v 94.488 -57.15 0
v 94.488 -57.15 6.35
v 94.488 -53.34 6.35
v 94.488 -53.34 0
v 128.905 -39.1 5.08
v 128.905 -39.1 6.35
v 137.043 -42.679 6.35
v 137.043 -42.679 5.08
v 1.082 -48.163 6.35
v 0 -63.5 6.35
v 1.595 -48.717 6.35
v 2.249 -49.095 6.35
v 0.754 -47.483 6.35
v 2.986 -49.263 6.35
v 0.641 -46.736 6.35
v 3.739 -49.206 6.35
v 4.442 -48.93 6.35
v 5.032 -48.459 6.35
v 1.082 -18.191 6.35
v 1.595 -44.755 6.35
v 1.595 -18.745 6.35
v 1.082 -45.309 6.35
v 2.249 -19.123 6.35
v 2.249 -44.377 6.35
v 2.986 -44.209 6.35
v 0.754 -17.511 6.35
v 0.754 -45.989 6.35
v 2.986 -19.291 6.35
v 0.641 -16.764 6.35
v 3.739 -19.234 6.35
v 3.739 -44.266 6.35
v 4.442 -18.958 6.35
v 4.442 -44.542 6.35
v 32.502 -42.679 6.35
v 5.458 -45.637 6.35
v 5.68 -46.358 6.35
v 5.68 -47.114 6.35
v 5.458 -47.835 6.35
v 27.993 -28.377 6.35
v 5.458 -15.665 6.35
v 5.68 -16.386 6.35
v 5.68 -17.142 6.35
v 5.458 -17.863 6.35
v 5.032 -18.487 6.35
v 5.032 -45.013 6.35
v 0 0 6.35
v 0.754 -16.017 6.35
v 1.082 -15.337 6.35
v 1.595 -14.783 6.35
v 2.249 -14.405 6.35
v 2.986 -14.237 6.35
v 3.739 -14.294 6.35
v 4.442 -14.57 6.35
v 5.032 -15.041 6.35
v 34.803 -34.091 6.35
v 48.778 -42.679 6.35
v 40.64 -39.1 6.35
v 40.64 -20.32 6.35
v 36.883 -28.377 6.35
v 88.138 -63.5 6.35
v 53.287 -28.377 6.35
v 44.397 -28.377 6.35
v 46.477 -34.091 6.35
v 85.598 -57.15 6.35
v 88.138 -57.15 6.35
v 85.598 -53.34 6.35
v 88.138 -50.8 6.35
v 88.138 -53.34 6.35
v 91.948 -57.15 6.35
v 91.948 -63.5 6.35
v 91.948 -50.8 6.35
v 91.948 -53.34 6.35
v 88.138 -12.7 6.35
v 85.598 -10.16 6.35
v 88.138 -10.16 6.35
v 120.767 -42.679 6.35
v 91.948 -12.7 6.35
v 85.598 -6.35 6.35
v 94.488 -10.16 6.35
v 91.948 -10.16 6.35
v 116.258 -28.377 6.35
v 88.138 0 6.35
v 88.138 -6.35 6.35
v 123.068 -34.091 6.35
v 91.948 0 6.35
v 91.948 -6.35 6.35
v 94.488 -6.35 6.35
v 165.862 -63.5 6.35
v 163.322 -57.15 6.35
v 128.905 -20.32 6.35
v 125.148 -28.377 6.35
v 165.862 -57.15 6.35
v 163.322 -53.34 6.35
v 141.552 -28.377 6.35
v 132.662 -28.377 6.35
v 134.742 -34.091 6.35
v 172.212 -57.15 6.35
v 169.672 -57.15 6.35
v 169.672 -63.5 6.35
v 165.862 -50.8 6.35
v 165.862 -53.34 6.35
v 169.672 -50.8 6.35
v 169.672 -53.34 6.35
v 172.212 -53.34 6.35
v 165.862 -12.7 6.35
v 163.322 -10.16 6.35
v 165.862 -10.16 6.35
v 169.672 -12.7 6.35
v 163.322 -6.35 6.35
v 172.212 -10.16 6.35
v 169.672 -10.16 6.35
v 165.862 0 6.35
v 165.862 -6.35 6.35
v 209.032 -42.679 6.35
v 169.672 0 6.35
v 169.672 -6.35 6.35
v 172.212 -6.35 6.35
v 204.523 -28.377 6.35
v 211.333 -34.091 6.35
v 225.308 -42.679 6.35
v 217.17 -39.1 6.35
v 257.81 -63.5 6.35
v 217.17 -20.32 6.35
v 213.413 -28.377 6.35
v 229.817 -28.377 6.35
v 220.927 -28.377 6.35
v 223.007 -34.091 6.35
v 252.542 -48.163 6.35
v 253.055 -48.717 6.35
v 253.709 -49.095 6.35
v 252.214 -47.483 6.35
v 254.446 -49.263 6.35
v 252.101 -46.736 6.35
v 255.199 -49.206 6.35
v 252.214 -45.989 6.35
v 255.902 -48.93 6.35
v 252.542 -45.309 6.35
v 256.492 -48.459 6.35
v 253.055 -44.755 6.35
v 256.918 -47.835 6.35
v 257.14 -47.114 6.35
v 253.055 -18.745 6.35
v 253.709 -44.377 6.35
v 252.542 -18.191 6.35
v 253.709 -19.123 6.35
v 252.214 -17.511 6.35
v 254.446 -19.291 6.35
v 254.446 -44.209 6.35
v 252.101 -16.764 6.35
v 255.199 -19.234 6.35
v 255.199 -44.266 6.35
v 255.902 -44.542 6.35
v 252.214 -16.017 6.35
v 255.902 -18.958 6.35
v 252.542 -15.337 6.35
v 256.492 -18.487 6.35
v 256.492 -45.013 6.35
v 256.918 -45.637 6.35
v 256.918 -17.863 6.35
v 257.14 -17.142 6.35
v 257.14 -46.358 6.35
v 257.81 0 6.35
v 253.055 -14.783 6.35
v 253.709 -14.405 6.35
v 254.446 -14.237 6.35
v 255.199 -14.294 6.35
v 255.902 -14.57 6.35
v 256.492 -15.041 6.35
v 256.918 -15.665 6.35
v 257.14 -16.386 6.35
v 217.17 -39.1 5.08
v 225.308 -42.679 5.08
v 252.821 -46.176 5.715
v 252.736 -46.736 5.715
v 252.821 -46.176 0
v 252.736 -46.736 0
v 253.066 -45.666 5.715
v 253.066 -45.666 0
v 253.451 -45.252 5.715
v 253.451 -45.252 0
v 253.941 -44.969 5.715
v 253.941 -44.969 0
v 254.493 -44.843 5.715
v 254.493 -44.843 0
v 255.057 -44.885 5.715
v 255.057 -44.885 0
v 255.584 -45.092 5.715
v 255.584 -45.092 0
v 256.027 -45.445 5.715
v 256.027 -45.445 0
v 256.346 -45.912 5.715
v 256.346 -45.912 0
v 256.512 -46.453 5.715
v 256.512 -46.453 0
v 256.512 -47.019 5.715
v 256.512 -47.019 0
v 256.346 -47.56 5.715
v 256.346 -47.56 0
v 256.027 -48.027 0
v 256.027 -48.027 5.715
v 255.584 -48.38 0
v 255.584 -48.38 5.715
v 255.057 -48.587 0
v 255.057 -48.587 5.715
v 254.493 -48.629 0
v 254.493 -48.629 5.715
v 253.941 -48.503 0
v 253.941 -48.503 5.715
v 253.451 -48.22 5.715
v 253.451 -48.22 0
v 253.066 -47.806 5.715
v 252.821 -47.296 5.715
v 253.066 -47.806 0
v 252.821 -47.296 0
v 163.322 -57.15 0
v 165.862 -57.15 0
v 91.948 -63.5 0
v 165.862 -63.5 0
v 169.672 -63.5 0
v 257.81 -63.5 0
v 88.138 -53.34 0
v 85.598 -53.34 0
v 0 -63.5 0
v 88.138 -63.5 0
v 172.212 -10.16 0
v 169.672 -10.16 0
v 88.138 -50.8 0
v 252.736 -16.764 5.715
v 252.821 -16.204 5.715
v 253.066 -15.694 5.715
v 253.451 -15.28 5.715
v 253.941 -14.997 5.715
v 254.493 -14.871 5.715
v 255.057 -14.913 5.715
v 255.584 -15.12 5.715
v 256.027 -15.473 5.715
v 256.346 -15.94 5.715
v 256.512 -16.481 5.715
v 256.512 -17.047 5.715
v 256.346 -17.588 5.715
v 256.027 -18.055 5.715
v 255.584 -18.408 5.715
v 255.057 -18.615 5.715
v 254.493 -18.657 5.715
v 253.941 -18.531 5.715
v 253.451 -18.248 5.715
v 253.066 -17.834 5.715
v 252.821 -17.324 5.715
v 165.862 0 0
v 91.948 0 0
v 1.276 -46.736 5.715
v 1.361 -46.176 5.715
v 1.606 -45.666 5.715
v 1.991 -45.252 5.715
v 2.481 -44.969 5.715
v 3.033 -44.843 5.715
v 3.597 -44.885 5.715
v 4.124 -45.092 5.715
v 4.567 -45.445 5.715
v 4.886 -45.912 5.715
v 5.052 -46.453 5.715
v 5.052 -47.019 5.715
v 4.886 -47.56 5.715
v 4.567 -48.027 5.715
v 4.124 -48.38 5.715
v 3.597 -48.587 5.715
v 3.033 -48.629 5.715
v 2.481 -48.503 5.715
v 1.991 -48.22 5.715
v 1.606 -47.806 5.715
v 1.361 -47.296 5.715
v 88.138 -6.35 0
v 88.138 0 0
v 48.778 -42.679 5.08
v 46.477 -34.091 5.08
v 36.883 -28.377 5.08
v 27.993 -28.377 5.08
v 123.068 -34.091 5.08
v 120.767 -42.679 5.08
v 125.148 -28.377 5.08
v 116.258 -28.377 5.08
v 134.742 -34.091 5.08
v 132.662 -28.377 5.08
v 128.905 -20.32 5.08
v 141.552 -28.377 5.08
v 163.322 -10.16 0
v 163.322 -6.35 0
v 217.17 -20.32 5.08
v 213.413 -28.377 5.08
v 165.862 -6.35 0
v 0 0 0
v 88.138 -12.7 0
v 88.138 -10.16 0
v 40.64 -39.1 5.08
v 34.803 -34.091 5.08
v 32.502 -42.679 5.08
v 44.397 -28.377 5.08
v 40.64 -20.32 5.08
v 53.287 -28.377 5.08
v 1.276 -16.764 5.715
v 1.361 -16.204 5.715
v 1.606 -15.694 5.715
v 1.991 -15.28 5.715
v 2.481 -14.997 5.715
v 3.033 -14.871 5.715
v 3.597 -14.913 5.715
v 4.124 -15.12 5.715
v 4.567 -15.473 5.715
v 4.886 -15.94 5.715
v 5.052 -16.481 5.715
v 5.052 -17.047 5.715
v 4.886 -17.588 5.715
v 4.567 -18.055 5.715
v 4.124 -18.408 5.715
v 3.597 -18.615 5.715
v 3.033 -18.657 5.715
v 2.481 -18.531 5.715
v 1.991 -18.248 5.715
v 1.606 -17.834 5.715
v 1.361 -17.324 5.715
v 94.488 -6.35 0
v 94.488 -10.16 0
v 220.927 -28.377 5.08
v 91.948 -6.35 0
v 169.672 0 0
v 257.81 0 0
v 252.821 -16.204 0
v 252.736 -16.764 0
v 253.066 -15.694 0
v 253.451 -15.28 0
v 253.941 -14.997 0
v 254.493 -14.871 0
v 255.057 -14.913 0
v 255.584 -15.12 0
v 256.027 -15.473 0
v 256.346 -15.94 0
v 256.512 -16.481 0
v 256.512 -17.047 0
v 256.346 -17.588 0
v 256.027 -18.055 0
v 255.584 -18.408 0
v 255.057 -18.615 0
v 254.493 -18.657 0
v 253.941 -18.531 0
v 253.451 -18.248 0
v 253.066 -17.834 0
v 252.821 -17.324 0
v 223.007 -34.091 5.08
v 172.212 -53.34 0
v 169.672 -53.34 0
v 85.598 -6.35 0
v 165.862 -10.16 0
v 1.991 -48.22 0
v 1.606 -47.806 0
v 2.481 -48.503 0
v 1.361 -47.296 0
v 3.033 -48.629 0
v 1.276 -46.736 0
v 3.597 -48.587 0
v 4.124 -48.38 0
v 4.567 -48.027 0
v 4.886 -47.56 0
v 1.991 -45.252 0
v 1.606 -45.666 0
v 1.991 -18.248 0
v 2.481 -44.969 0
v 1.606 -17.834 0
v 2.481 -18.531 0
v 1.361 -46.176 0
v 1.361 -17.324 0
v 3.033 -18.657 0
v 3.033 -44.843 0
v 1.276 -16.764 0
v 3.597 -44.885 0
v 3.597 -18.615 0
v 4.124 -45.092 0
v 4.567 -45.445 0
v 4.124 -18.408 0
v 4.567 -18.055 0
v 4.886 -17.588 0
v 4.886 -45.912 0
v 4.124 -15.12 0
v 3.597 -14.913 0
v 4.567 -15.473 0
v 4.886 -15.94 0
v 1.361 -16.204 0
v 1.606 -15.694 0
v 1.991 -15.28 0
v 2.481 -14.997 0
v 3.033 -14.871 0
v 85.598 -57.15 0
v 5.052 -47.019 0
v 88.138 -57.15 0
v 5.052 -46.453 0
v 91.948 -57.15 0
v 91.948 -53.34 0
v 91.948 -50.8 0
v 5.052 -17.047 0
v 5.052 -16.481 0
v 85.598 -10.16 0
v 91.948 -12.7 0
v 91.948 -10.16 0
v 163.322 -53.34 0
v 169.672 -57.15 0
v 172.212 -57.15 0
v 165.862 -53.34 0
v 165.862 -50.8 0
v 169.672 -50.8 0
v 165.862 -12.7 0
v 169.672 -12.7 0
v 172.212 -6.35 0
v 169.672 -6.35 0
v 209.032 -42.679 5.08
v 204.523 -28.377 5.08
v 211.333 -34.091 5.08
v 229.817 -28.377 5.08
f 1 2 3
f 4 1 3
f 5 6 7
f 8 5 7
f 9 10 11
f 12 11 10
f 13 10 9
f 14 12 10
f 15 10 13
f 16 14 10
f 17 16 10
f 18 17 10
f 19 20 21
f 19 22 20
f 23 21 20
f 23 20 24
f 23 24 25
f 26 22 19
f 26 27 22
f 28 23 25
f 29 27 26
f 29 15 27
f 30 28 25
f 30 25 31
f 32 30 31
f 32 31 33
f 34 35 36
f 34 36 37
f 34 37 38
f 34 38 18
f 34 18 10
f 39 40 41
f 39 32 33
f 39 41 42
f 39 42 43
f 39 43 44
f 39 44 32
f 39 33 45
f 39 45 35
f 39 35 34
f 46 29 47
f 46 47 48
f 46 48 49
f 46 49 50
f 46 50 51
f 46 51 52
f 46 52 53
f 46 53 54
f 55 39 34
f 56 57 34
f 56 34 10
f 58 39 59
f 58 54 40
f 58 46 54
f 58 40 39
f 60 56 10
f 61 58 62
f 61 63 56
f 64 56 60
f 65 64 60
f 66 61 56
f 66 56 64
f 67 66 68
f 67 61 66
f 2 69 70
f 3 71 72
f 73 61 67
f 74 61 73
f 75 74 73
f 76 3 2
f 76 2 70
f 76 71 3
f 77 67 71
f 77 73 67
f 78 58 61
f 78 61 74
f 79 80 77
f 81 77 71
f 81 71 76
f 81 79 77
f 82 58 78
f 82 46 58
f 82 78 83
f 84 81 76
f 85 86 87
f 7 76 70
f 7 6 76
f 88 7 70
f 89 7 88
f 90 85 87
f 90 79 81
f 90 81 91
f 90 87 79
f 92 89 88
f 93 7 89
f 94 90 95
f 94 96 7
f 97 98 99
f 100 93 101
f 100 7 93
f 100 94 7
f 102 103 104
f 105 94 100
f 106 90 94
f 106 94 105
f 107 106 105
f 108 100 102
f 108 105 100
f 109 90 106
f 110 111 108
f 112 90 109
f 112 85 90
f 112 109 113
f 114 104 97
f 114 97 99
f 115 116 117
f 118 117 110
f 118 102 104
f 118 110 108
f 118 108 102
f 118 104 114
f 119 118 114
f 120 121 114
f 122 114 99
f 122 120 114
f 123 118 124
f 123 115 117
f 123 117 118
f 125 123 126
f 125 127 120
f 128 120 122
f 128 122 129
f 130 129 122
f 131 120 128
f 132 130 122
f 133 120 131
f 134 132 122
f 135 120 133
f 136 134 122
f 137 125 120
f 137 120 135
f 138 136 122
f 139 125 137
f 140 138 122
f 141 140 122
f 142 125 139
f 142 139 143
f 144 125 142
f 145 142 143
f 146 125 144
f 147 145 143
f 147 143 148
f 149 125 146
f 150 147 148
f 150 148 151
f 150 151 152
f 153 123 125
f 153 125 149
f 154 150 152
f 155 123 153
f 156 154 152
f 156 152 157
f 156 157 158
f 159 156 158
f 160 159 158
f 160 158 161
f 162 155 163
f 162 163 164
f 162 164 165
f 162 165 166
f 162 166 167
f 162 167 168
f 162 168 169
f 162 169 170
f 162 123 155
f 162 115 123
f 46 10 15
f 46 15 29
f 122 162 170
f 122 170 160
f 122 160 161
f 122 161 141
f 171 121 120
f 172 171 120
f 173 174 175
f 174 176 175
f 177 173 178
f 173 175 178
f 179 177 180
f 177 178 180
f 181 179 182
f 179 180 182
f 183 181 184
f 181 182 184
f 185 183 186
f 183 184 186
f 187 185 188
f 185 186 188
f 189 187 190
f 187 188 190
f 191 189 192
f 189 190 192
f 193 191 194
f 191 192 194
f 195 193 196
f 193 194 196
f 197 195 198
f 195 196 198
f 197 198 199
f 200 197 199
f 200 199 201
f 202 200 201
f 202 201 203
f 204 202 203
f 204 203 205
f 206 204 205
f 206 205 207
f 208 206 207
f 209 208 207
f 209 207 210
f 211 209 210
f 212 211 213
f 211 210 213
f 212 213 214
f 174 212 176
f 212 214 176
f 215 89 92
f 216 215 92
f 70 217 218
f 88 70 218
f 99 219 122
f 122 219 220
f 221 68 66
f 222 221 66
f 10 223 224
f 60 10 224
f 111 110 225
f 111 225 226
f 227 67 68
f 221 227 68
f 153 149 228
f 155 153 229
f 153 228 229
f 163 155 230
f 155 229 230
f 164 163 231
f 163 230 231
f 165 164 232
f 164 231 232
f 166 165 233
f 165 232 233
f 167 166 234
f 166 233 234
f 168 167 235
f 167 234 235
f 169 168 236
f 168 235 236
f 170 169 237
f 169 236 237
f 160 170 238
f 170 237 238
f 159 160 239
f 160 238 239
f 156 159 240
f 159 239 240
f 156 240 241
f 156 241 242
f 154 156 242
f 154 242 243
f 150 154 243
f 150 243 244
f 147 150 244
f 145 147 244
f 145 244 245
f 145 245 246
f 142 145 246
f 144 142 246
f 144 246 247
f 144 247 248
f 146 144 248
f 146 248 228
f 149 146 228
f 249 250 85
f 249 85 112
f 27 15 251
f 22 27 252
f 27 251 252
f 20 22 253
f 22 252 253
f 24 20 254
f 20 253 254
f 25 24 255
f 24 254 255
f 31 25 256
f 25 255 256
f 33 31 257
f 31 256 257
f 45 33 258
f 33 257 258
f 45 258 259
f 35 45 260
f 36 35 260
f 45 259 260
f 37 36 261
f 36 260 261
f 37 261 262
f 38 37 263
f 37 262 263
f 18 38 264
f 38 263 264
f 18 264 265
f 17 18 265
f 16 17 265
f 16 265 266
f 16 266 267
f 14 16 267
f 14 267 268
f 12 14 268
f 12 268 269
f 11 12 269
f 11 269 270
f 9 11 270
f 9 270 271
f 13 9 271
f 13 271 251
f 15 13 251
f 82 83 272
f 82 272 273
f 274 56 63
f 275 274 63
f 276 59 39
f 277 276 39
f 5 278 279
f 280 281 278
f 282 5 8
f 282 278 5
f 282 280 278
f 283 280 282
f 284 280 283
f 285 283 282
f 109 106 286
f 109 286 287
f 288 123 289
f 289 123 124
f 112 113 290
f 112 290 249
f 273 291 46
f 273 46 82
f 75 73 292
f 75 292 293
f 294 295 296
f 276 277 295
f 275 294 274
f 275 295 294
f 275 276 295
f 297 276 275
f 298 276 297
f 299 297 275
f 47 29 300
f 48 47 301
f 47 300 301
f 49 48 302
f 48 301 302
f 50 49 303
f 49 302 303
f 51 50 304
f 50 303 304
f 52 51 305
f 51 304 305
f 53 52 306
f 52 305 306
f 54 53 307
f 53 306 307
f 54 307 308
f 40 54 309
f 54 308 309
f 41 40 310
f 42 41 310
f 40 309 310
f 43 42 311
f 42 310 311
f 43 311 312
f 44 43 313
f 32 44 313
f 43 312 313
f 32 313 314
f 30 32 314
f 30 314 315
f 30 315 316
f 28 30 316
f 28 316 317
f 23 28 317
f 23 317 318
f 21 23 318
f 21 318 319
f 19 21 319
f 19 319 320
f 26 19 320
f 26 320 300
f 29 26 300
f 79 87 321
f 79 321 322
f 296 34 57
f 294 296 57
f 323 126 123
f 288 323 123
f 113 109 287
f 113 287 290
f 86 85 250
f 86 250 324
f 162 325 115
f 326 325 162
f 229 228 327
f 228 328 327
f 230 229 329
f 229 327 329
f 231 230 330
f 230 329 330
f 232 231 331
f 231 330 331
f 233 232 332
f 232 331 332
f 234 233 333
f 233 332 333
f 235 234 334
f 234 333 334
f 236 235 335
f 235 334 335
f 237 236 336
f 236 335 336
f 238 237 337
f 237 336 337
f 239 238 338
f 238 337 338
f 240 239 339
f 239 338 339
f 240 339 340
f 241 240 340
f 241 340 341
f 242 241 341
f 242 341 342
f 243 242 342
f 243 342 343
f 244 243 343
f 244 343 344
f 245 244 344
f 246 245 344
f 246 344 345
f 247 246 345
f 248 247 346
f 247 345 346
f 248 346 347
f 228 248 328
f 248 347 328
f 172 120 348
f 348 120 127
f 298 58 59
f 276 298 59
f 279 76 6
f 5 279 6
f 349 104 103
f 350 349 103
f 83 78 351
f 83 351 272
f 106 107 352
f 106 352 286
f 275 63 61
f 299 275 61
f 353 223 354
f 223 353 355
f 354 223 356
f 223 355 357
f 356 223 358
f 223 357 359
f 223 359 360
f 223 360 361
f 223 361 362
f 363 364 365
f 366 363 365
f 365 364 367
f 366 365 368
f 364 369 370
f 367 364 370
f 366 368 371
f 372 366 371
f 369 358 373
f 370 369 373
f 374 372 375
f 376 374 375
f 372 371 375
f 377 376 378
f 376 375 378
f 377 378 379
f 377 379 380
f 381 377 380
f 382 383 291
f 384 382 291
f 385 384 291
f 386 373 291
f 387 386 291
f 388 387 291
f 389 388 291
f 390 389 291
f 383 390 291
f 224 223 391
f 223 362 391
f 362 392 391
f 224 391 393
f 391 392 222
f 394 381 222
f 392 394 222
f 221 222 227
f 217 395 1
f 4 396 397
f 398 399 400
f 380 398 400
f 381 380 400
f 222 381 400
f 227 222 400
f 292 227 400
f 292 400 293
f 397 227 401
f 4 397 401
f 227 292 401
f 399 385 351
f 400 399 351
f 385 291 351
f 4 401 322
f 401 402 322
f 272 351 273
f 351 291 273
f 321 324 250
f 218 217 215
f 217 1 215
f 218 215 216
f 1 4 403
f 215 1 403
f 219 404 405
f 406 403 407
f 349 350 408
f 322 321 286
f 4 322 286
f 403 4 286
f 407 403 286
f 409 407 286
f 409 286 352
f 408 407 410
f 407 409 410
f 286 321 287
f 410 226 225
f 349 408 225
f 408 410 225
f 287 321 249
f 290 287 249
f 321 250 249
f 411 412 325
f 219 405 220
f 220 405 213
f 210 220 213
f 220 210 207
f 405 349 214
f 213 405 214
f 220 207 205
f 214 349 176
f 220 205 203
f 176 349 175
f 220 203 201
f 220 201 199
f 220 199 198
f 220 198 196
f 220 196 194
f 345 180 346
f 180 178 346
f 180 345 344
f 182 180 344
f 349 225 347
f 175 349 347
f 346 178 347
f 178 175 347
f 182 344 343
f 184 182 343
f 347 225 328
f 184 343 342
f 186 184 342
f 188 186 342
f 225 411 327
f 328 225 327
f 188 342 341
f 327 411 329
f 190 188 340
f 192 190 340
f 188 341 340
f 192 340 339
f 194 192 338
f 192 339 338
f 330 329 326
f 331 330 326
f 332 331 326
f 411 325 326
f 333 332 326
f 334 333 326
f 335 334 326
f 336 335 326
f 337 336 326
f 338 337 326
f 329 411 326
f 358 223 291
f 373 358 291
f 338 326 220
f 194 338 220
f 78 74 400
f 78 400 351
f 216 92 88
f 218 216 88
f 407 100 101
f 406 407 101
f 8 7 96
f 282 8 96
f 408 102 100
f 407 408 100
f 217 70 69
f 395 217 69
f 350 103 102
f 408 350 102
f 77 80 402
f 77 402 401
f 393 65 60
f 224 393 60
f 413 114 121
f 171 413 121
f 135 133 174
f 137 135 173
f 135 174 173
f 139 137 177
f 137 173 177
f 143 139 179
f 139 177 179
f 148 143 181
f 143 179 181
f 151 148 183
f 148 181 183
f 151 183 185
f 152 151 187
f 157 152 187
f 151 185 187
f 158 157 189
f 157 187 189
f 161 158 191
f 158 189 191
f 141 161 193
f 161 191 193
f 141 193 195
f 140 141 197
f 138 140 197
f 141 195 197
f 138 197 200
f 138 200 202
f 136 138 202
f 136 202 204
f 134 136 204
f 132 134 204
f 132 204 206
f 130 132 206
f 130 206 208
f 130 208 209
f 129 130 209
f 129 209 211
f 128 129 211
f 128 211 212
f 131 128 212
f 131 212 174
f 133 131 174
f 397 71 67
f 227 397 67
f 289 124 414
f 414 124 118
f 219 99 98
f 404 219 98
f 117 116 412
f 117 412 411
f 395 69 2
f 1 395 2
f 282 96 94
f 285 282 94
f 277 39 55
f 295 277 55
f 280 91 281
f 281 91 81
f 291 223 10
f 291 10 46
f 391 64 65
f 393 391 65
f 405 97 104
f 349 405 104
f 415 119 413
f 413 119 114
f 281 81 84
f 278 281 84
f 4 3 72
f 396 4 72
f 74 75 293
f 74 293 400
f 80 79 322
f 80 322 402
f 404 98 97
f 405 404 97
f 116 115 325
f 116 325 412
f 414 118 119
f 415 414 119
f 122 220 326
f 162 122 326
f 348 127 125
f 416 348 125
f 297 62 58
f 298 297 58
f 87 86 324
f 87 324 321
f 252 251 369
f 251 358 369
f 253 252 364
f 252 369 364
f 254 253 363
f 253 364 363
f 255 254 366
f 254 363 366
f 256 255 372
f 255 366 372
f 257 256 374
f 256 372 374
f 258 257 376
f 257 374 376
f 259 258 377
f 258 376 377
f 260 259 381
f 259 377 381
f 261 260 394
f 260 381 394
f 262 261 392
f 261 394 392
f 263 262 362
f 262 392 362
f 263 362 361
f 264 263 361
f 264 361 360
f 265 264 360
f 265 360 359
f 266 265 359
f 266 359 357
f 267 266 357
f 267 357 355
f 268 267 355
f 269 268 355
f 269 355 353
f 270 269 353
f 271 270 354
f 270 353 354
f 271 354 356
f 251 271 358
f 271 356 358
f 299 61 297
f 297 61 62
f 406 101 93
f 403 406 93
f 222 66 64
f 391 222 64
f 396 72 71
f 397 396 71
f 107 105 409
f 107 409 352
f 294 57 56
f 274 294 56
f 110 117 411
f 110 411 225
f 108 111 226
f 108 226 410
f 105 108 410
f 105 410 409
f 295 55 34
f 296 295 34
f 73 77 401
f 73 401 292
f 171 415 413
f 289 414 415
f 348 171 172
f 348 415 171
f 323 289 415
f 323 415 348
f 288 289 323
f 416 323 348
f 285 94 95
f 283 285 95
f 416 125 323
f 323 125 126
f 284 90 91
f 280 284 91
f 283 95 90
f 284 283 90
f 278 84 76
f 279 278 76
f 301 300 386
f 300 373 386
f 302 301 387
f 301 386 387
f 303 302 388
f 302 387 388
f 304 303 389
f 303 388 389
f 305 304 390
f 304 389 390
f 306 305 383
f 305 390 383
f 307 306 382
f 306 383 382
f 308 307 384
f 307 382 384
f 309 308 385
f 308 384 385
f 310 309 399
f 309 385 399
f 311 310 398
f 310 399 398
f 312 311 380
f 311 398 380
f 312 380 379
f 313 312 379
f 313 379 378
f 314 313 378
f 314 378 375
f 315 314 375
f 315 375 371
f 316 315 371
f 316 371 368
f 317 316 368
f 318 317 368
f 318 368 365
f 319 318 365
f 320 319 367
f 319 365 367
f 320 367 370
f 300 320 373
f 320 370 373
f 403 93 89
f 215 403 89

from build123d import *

# Parameters (mm, degrees)
SKETCH1_W                       = 257.81
SKETCH1_H                       = 63.5
BOSS_EXTRUDE1_DEPTH             = 6.35
CUT_EXTRUDE2_DEPTH              = 1.27
CUT_EXTRUDE3_DEPTH              = 266.590979892
F_6_CLEARANCE_HOLE1_D           = 3.7973
F_6_CLEARANCE_HOLE1_CSINK_D     = 5.0673
F_6_CLEARANCE_HOLE1_CSINK_ANGLE = 90


with BuildPart() as part:
    # Sketch1 → Boss-Extrude1 (new body)
    with BuildSketch(Plane.XY):
        with Locations((128.905, -31.75)):
            Rectangle(SKETCH1_W, SKETCH1_H)
    extrude(amount=BOSS_EXTRUDE1_DEPTH)

    # Sketch4 → Cut-Extrude2 (cut)
    with BuildSketch(Plane.XY.offset(6.35)):
        Polygon((128.905, -20.32), (125.147923653, -28.377076227), (116.257923653, -28.377076227), (123.068058752, -34.091458077), (120.767157441, -42.678538673), (128.905, -39.09976535), (137.042842559, -42.678538673), (134.741941248, -34.091458077), (141.552076347, -28.377076227), (132.662076347, -28.377076227), align=None)
        Polygon((217.17, -20.32), (213.412923653, -28.377076227), (204.522923653, -28.377076227), (211.333058752, -34.091458077), (209.032157441, -42.678538673), (217.17, -39.09976535), (225.307842559, -42.678538673), (223.006941248, -34.091458077), (229.817076347, -28.377076227), (220.927076347, -28.377076227), align=None)
        Polygon((40.64, -20.32), (36.882923653, -28.377076227), (27.992923653, -28.377076227), (34.803058752, -34.091458077), (32.502157441, -42.678538673), (40.64, -39.09976535), (48.777842559, -42.678538673), (46.476941248, -34.091458077), (53.287076347, -28.377076227), (44.397076347, -28.377076227), align=None)
    extrude(amount=-CUT_EXTRUDE2_DEPTH, mode=Mode.SUBTRACT)

    # Sketch6 → Cut-Extrude3 (cut, through all)
    with BuildSketch(Plane.XY.offset(6.35)):
        Polygon((88.138, 0), (91.948, 0), (91.948, -6.35), (94.488, -6.35), (94.488, -10.16), (91.948, -10.16), (91.948, -12.7), (88.138, -12.7), (88.138, -10.16), (85.598, -10.16), (85.598, -6.35), (88.138, -6.35), align=None)
        Polygon((165.862, 0), (169.672, 0), (169.672, -6.35), (172.212, -6.35), (172.212, -10.16), (169.672, -10.16), (169.672, -12.7), (165.862, -12.7), (165.862, -10.16), (163.322, -10.16), (163.322, -6.35), (165.862, -6.35), align=None)
        Polygon((88.138, -63.5), (91.948, -63.5), (91.948, -57.15), (94.488, -57.15), (94.488, -53.34), (91.948, -53.34), (91.948, -50.8), (88.138, -50.8), (88.138, -53.34), (85.598, -53.34), (85.598, -57.15), (88.138, -57.15), align=None)
        Polygon((165.862, -63.5), (169.672, -63.5), (169.672, -57.15), (172.212, -57.15), (172.212, -53.34), (169.672, -53.34), (169.672, -50.8), (165.862, -50.8), (165.862, -53.34), (163.322, -53.34), (163.322, -57.15), (165.862, -57.15), align=None)
    extrude(amount=-CUT_EXTRUDE3_DEPTH, mode=Mode.SUBTRACT)

    # #6 Clearance Hole1 (through all)
    with Locations(Plane.XY.offset(6.35)):
        with Locations((3.175, -16.764), (3.175, -46.736), (254.635, -46.736), (254.635, -16.764)):
            CounterSinkHole(F_6_CLEARANCE_HOLE1_D / 2, F_6_CLEARANCE_HOLE1_CSINK_D / 2, counter_sink_angle=F_6_CLEARANCE_HOLE1_CSINK_ANGLE)


solid = part.part
